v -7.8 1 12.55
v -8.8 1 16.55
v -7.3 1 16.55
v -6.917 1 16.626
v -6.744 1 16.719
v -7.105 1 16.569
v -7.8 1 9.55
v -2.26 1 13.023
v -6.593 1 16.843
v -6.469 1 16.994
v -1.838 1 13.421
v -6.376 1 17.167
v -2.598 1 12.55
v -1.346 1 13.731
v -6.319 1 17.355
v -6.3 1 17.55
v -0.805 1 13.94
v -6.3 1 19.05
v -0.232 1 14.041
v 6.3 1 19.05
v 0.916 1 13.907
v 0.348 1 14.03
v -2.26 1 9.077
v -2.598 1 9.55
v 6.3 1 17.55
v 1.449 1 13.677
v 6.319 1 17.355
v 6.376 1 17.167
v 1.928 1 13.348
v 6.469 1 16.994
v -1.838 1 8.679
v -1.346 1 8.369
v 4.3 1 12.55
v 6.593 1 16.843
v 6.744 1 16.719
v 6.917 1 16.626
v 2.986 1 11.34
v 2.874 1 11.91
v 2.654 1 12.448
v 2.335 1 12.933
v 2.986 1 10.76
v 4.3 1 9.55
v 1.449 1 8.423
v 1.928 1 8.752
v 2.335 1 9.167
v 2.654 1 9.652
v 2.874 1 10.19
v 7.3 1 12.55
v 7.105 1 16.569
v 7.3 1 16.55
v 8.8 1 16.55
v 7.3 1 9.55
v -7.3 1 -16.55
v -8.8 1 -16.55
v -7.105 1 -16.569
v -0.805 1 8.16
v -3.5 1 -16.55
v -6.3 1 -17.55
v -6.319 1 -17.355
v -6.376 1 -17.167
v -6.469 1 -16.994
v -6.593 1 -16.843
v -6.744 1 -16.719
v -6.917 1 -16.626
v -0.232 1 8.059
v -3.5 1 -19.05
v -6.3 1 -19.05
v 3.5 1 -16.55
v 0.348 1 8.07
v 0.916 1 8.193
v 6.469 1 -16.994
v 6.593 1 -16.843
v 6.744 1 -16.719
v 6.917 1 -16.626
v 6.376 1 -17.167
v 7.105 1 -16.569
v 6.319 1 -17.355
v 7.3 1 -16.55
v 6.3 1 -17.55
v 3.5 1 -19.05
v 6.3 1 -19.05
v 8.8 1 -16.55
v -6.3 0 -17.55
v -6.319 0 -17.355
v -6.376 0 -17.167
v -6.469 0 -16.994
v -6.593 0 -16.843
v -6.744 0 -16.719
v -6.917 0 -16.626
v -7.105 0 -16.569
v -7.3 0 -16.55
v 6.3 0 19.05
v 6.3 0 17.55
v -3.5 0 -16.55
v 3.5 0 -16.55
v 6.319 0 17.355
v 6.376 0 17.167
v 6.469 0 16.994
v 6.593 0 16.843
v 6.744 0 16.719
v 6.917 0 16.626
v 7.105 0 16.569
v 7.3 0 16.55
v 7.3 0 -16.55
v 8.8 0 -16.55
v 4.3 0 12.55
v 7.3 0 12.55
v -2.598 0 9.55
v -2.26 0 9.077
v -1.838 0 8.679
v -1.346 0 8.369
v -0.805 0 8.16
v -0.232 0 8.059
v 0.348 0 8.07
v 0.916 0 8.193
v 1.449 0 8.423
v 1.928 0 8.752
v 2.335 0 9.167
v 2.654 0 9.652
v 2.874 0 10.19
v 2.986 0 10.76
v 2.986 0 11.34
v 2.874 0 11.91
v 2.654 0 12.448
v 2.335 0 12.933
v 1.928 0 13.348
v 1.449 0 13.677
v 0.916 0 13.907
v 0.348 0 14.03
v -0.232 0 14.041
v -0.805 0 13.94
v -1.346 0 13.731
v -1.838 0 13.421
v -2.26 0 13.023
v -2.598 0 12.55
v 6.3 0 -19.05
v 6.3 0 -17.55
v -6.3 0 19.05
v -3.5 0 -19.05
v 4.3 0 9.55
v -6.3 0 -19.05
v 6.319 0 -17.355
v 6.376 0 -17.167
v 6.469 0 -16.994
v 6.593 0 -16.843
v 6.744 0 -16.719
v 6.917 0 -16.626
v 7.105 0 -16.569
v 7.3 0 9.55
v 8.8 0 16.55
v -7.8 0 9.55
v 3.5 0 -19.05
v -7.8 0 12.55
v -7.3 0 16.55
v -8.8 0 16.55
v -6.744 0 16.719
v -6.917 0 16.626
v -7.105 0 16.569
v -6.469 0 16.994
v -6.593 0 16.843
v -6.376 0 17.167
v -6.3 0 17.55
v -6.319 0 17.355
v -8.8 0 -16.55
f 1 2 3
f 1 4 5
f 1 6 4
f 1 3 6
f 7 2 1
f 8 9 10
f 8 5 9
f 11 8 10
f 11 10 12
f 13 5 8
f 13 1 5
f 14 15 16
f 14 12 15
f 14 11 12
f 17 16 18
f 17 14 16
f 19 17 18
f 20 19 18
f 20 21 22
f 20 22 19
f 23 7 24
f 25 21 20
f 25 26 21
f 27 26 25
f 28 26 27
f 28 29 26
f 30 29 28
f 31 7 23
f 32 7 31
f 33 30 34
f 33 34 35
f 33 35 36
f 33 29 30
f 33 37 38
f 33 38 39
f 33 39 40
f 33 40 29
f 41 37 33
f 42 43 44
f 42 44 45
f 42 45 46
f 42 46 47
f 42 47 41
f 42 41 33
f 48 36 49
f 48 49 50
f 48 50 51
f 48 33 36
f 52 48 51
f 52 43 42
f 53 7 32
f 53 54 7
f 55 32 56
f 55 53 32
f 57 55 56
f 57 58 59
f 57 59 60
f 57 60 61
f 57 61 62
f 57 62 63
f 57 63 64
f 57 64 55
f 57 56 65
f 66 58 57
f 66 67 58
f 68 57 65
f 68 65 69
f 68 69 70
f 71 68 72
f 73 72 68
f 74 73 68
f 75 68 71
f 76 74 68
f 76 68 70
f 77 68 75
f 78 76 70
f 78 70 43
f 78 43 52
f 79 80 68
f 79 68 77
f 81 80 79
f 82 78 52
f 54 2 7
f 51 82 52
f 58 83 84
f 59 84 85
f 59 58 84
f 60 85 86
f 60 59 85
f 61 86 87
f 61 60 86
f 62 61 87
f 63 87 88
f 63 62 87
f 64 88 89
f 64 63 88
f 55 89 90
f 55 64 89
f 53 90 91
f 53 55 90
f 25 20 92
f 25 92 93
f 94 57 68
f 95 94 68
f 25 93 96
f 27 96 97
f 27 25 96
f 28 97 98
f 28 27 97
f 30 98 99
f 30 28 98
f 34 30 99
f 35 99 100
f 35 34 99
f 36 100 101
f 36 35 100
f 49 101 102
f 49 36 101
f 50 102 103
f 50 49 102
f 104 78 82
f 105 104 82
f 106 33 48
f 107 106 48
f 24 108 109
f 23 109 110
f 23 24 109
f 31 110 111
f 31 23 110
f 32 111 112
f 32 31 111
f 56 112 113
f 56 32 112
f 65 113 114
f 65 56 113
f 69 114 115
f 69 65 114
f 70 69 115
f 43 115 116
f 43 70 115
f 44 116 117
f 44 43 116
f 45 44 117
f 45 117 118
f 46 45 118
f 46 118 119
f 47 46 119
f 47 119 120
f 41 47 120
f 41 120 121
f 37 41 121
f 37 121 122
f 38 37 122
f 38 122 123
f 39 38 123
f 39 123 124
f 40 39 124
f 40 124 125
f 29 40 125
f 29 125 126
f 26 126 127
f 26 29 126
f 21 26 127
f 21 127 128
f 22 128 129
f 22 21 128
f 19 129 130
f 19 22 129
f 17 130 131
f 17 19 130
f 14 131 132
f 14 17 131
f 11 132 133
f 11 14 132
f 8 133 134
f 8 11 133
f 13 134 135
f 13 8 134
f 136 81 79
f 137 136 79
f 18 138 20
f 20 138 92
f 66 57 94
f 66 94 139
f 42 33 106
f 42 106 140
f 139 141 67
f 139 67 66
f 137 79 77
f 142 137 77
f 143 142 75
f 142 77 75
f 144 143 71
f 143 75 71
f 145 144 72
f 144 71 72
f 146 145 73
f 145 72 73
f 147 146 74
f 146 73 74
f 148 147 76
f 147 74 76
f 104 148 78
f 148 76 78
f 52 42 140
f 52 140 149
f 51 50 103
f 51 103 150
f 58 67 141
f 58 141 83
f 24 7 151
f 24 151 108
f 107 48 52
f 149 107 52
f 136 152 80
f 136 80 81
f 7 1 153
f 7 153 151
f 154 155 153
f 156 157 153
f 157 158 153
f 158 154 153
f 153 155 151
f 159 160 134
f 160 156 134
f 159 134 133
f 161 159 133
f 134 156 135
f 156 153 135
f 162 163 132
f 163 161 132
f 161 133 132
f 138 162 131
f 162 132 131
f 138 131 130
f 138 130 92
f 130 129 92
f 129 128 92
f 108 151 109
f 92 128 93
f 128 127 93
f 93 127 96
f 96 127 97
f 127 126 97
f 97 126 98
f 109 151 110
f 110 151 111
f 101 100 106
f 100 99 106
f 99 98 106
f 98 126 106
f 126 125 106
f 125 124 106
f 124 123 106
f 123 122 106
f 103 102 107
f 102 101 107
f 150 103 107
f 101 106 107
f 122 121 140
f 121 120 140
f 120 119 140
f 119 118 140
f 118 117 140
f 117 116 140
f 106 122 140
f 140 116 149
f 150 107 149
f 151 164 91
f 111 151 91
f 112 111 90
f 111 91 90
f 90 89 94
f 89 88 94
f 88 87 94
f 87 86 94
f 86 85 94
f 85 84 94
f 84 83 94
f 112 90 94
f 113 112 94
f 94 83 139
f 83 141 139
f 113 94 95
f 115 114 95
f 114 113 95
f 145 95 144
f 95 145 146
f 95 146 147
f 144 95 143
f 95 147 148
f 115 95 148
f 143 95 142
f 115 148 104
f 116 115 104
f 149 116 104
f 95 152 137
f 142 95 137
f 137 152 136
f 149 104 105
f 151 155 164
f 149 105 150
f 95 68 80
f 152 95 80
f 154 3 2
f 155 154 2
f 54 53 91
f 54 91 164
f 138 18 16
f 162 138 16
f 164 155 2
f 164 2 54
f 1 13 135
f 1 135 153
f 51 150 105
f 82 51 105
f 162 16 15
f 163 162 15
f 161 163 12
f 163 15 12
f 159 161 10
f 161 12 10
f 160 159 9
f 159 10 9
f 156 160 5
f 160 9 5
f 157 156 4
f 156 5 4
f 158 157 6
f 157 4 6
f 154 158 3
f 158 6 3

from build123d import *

# Parameters (mm, degrees)
SKETCH_2_W          = 17.6
SKETCH_2_H          = 38.1
EXTRUDE_2_DEPTH     = 1
CUT_EXTRUDE_3_REACH = 23.008
SKETCH_3_W          = 7
SKETCH_3_H          = 2.5
SKETCH_3_W_2        = 3
SKETCH_3_H_2        = 3


with BuildPart() as part:
    # 草圖2 → 伸長2 (new body)
    with BuildSketch(Plane(origin=(0, 0, 0), x_dir=(1, 0, 0), z_dir=(0, 1, 0))):
        Rectangle(SKETCH_2_W, SKETCH_2_H)
    extrude(amount=EXTRUDE_2_DEPTH)

    # 草圖3 → 伸長3 (cut, up to next)
    with BuildSketch(Plane(origin=(0, 1, 0), x_dir=(1, 0, 0), z_dir=(0, 1, 0)), mode=Mode.PRIVATE) as cut_extrude_3_sk1:
        with Locations((0, 17.8)):
            Rectangle(SKETCH_3_W, SKETCH_3_H)
    cut_extrude_3_tool1 = extrude(cut_extrude_3_sk1.sketch, amount=-CUT_EXTRUDE_3_REACH, mode=Mode.PRIVATE) & part.part
    # 草圖3 → 伸長3 (cut, up to next)
    with BuildSketch(Plane(origin=(0, 1, 0), x_dir=(1, 0, 0), z_dir=(0, 1, 0)), mode=Mode.PRIVATE) as cut_extrude_3_sk2:
        with BuildLine():
            Line((8.8, 19.05), (6.3, 19.05))
            Line((6.3, 19.05), (6.3, 17.55))
            ThreePointArc((6.3, 17.55), (6.592893219, 16.842893219), (7.3, 16.55))
            Line((7.3, 16.55), (8.8, 16.55))
            Line((8.8, 16.55), (8.8, 19.05))
        make_face()
    cut_extrude_3_tool2 = extrude(cut_extrude_3_sk2.sketch, amount=-CUT_EXTRUDE_3_REACH, mode=Mode.PRIVATE) & part.part
    # 草圖3 → 伸長3 (cut, up to next)
    with BuildSketch(Plane(origin=(0, 1, 0), x_dir=(1, 0, 0), z_dir=(0, 1, 0)), mode=Mode.PRIVATE) as cut_extrude_3_sk3:
        with BuildLine():
            Line((-8.8, 19.05), (-6.3, 19.05))
            Line((-6.3, 19.05), (-6.3, 17.55))
            ThreePointArc((-6.3, 17.55), (-6.592893219, 16.842893219), (-7.3, 16.55))
            Line((-7.3, 16.55), (-8.8, 16.55))
            Line((-8.8, 16.55), (-8.8, 19.05))
        make_face()
    cut_extrude_3_tool3 = extrude(cut_extrude_3_sk3.sketch, amount=-CUT_EXTRUDE_3_REACH, mode=Mode.PRIVATE) & part.part
    # 草圖3 → 伸長3 (cut, up to next)
    with BuildSketch(Plane(origin=(0, 1, 0), x_dir=(1, 0, 0), z_dir=(0, 1, 0)), mode=Mode.PRIVATE) as cut_extrude_3_sk4:
        with BuildLine():
            Line((-8.8, -19.05), (-6.3, -19.05))
            Line((-6.3, -19.05), (-6.3, -17.55))
            ThreePointArc((-6.3, -17.55), (-6.592893219, -16.842893219), (-7.3, -16.55))
            Line((-7.3, -16.55), (-8.8, -16.55))
            Line((-8.8, -16.55), (-8.8, -19.05))
        make_face()
    cut_extrude_3_tool4 = extrude(cut_extrude_3_sk4.sketch, amount=-CUT_EXTRUDE_3_REACH, mode=Mode.PRIVATE) & part.part
    # 草圖3 → 伸長3 (cut, up to next)
    with BuildSketch(Plane(origin=(0, 1, 0), x_dir=(1, 0, 0), z_dir=(0, 1, 0)), mode=Mode.PRIVATE) as cut_extrude_3_sk5:
        with BuildLine():
            Line((7.3, -16.55), (8.8, -16.55))
            Line((8.8, -16.55), (8.8, -19.05))
            Line((8.8, -19.05), (6.3, -19.05))
            Line((6.3, -19.05), (6.3, -17.55))
            ThreePointArc((6.3, -17.55), (6.592893219, -16.842893219), (7.3, -16.55))
        make_face()
    cut_extrude_3_tool5 = extrude(cut_extrude_3_sk5.sketch, amount=-CUT_EXTRUDE_3_REACH, mode=Mode.PRIVATE) & part.part
    # 草圖3 → 伸長3 (cut, up to next)
    with BuildSketch(Plane(origin=(0, 1, 0), x_dir=(1, 0, 0), z_dir=(0, 1, 0)), mode=Mode.PRIVATE) as cut_extrude_3_sk6:
        with BuildLine():
            Line((-7.8, -9.55), (-2.598076211, -9.55))
            ThreePointArc((-2.598076211, -9.55), (3, -11.05), (-2.598076211, -12.55))
            Line((-2.598076211, -12.55), (-7.8, -12.55))
            Line((-7.8, -12.55), (-7.8, -9.55))
        make_face()
    cut_extrude_3_tool6 = extrude(cut_extrude_3_sk6.sketch, amount=-CUT_EXTRUDE_3_REACH, mode=Mode.PRIVATE) & part.part
    # 草圖3 → 伸長3 (cut, up to next)
    with BuildSketch(Plane(origin=(0, 1, 0), x_dir=(1, 0, 0), z_dir=(0, 1, 0)), mode=Mode.PRIVATE) as cut_extrude_3_sk7:
        with Locations((5.8, -11.05)):
            Rectangle(SKETCH_3_W_2, SKETCH_3_H_2)
    cut_extrude_3_tool7 = extrude(cut_extrude_3_sk7.sketch, amount=-CUT_EXTRUDE_3_REACH, mode=Mode.PRIVATE) & part.part
    add(cut_extrude_3_tool1.solids().sort_by_distance((0, 1, -17.8))[0], mode=Mode.SUBTRACT)
    add(cut_extrude_3_tool2.solids().sort_by_distance((7.586504, 1, -17.836504))[0], mode=Mode.SUBTRACT)
    add(cut_extrude_3_tool3.solids().sort_by_distance((-7.586504, 1, -17.836504))[0], mode=Mode.SUBTRACT)
    add(cut_extrude_3_tool4.solids().sort_by_distance((-7.586504, 1, 17.836504))[0], mode=Mode.SUBTRACT)
    add(cut_extrude_3_tool5.solids().sort_by_distance((7.586504, 1, 17.836504))[0], mode=Mode.SUBTRACT)
    add(cut_extrude_3_tool6.solids().sort_by_distance((-1.831773, 1, 11.05))[0], mode=Mode.SUBTRACT)
    add(cut_extrude_3_tool7.solids().sort_by_distance((5.8, 1, 11.05))[0], mode=Mode.SUBTRACT)


solid = part.part
